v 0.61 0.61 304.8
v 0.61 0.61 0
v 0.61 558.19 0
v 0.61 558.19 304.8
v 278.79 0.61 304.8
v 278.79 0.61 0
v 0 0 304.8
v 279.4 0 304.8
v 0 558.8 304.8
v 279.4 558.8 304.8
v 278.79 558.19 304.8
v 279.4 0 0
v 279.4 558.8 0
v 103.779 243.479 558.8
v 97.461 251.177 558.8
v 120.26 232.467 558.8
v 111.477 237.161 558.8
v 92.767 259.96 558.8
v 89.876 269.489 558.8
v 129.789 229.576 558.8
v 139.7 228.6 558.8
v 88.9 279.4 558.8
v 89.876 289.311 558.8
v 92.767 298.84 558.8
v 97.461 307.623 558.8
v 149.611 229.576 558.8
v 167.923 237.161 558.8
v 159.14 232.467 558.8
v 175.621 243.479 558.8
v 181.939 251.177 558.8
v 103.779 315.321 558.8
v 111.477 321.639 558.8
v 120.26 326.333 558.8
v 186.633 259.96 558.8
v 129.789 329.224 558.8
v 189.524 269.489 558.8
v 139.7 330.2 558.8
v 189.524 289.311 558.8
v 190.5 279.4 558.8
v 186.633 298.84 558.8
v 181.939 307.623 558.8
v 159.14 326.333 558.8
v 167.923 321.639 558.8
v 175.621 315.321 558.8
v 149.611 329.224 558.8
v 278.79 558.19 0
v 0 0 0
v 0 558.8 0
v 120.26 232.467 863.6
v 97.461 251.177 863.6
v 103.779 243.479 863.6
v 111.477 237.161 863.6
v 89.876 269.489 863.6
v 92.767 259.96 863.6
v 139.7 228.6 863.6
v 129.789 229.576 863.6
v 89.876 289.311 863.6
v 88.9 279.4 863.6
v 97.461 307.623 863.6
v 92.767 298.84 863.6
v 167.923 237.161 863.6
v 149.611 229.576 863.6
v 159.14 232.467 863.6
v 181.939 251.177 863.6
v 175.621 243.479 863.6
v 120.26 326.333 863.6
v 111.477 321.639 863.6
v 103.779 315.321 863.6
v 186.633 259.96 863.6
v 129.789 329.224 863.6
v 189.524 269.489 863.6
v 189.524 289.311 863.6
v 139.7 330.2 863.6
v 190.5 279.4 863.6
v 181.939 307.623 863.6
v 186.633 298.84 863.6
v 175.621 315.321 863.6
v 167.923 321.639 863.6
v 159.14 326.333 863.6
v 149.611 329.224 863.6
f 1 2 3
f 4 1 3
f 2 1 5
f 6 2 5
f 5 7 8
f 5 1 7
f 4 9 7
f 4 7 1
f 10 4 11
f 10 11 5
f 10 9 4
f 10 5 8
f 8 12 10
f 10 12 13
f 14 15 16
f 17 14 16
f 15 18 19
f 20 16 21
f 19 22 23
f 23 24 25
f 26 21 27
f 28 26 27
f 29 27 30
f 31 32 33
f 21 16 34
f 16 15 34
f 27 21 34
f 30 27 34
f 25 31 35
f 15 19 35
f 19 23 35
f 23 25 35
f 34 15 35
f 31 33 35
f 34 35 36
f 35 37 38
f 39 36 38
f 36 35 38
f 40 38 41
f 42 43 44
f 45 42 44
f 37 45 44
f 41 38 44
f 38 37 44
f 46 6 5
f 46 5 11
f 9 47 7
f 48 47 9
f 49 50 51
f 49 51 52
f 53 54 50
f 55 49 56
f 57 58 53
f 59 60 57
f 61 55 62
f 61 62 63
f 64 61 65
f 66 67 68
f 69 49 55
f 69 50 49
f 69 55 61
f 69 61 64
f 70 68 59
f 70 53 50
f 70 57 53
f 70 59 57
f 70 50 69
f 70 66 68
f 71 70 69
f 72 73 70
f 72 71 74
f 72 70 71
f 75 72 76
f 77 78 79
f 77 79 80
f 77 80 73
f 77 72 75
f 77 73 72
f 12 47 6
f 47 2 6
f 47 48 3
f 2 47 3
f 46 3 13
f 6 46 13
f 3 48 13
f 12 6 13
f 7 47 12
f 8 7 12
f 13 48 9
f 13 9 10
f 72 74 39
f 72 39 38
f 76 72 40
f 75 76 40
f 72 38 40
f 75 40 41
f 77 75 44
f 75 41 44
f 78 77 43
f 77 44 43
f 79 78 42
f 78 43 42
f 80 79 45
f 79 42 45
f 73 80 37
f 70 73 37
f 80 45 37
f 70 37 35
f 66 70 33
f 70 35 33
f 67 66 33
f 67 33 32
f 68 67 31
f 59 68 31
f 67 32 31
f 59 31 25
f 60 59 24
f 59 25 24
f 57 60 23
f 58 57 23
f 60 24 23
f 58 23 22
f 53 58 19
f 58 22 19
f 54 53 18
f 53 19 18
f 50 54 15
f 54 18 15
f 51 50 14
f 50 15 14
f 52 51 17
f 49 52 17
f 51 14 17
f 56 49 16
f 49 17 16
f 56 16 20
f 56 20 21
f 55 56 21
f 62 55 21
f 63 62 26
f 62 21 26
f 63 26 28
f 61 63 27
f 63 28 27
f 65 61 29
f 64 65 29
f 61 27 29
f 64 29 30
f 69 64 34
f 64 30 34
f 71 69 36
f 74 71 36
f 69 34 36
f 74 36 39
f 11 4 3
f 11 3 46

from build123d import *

# Parameters (mm, degrees)
F0_W      = 279.4
F0_H      = 558.8
F0_W_2    = 278.1808
F0_H_2    = 557.5808
F1_DEPTH  = 304.8
F10_R     = 50.8
F11_DEPTH = 304.8


# Not quite as in the source:
# - the program builds the solid bodies; features that only make, move or delete a surface that nothing else refers to are left out


with BuildPart() as f1:
    # F0 (on Top) → F1 (new body)
    with BuildSketch(Plane.XY):
        with Locations((139.7, 279.4)):
            Rectangle(F0_W, F0_H)
        with Locations((139.7, 279.4)):
            Rectangle(F0_W_2, F0_H_2, mode=Mode.SUBTRACT)
    extrude(amount=F1_DEPTH)


with BuildPart() as f11:
    # F10 (on offset) → F11 (new body)
    with BuildSketch(Plane.XY.offset(558.8)):
        with Locations((139.7, 279.4)):
            Circle(F10_R)
    extrude(amount=F11_DEPTH)


solid = Compound([f1.part, f11.part])
